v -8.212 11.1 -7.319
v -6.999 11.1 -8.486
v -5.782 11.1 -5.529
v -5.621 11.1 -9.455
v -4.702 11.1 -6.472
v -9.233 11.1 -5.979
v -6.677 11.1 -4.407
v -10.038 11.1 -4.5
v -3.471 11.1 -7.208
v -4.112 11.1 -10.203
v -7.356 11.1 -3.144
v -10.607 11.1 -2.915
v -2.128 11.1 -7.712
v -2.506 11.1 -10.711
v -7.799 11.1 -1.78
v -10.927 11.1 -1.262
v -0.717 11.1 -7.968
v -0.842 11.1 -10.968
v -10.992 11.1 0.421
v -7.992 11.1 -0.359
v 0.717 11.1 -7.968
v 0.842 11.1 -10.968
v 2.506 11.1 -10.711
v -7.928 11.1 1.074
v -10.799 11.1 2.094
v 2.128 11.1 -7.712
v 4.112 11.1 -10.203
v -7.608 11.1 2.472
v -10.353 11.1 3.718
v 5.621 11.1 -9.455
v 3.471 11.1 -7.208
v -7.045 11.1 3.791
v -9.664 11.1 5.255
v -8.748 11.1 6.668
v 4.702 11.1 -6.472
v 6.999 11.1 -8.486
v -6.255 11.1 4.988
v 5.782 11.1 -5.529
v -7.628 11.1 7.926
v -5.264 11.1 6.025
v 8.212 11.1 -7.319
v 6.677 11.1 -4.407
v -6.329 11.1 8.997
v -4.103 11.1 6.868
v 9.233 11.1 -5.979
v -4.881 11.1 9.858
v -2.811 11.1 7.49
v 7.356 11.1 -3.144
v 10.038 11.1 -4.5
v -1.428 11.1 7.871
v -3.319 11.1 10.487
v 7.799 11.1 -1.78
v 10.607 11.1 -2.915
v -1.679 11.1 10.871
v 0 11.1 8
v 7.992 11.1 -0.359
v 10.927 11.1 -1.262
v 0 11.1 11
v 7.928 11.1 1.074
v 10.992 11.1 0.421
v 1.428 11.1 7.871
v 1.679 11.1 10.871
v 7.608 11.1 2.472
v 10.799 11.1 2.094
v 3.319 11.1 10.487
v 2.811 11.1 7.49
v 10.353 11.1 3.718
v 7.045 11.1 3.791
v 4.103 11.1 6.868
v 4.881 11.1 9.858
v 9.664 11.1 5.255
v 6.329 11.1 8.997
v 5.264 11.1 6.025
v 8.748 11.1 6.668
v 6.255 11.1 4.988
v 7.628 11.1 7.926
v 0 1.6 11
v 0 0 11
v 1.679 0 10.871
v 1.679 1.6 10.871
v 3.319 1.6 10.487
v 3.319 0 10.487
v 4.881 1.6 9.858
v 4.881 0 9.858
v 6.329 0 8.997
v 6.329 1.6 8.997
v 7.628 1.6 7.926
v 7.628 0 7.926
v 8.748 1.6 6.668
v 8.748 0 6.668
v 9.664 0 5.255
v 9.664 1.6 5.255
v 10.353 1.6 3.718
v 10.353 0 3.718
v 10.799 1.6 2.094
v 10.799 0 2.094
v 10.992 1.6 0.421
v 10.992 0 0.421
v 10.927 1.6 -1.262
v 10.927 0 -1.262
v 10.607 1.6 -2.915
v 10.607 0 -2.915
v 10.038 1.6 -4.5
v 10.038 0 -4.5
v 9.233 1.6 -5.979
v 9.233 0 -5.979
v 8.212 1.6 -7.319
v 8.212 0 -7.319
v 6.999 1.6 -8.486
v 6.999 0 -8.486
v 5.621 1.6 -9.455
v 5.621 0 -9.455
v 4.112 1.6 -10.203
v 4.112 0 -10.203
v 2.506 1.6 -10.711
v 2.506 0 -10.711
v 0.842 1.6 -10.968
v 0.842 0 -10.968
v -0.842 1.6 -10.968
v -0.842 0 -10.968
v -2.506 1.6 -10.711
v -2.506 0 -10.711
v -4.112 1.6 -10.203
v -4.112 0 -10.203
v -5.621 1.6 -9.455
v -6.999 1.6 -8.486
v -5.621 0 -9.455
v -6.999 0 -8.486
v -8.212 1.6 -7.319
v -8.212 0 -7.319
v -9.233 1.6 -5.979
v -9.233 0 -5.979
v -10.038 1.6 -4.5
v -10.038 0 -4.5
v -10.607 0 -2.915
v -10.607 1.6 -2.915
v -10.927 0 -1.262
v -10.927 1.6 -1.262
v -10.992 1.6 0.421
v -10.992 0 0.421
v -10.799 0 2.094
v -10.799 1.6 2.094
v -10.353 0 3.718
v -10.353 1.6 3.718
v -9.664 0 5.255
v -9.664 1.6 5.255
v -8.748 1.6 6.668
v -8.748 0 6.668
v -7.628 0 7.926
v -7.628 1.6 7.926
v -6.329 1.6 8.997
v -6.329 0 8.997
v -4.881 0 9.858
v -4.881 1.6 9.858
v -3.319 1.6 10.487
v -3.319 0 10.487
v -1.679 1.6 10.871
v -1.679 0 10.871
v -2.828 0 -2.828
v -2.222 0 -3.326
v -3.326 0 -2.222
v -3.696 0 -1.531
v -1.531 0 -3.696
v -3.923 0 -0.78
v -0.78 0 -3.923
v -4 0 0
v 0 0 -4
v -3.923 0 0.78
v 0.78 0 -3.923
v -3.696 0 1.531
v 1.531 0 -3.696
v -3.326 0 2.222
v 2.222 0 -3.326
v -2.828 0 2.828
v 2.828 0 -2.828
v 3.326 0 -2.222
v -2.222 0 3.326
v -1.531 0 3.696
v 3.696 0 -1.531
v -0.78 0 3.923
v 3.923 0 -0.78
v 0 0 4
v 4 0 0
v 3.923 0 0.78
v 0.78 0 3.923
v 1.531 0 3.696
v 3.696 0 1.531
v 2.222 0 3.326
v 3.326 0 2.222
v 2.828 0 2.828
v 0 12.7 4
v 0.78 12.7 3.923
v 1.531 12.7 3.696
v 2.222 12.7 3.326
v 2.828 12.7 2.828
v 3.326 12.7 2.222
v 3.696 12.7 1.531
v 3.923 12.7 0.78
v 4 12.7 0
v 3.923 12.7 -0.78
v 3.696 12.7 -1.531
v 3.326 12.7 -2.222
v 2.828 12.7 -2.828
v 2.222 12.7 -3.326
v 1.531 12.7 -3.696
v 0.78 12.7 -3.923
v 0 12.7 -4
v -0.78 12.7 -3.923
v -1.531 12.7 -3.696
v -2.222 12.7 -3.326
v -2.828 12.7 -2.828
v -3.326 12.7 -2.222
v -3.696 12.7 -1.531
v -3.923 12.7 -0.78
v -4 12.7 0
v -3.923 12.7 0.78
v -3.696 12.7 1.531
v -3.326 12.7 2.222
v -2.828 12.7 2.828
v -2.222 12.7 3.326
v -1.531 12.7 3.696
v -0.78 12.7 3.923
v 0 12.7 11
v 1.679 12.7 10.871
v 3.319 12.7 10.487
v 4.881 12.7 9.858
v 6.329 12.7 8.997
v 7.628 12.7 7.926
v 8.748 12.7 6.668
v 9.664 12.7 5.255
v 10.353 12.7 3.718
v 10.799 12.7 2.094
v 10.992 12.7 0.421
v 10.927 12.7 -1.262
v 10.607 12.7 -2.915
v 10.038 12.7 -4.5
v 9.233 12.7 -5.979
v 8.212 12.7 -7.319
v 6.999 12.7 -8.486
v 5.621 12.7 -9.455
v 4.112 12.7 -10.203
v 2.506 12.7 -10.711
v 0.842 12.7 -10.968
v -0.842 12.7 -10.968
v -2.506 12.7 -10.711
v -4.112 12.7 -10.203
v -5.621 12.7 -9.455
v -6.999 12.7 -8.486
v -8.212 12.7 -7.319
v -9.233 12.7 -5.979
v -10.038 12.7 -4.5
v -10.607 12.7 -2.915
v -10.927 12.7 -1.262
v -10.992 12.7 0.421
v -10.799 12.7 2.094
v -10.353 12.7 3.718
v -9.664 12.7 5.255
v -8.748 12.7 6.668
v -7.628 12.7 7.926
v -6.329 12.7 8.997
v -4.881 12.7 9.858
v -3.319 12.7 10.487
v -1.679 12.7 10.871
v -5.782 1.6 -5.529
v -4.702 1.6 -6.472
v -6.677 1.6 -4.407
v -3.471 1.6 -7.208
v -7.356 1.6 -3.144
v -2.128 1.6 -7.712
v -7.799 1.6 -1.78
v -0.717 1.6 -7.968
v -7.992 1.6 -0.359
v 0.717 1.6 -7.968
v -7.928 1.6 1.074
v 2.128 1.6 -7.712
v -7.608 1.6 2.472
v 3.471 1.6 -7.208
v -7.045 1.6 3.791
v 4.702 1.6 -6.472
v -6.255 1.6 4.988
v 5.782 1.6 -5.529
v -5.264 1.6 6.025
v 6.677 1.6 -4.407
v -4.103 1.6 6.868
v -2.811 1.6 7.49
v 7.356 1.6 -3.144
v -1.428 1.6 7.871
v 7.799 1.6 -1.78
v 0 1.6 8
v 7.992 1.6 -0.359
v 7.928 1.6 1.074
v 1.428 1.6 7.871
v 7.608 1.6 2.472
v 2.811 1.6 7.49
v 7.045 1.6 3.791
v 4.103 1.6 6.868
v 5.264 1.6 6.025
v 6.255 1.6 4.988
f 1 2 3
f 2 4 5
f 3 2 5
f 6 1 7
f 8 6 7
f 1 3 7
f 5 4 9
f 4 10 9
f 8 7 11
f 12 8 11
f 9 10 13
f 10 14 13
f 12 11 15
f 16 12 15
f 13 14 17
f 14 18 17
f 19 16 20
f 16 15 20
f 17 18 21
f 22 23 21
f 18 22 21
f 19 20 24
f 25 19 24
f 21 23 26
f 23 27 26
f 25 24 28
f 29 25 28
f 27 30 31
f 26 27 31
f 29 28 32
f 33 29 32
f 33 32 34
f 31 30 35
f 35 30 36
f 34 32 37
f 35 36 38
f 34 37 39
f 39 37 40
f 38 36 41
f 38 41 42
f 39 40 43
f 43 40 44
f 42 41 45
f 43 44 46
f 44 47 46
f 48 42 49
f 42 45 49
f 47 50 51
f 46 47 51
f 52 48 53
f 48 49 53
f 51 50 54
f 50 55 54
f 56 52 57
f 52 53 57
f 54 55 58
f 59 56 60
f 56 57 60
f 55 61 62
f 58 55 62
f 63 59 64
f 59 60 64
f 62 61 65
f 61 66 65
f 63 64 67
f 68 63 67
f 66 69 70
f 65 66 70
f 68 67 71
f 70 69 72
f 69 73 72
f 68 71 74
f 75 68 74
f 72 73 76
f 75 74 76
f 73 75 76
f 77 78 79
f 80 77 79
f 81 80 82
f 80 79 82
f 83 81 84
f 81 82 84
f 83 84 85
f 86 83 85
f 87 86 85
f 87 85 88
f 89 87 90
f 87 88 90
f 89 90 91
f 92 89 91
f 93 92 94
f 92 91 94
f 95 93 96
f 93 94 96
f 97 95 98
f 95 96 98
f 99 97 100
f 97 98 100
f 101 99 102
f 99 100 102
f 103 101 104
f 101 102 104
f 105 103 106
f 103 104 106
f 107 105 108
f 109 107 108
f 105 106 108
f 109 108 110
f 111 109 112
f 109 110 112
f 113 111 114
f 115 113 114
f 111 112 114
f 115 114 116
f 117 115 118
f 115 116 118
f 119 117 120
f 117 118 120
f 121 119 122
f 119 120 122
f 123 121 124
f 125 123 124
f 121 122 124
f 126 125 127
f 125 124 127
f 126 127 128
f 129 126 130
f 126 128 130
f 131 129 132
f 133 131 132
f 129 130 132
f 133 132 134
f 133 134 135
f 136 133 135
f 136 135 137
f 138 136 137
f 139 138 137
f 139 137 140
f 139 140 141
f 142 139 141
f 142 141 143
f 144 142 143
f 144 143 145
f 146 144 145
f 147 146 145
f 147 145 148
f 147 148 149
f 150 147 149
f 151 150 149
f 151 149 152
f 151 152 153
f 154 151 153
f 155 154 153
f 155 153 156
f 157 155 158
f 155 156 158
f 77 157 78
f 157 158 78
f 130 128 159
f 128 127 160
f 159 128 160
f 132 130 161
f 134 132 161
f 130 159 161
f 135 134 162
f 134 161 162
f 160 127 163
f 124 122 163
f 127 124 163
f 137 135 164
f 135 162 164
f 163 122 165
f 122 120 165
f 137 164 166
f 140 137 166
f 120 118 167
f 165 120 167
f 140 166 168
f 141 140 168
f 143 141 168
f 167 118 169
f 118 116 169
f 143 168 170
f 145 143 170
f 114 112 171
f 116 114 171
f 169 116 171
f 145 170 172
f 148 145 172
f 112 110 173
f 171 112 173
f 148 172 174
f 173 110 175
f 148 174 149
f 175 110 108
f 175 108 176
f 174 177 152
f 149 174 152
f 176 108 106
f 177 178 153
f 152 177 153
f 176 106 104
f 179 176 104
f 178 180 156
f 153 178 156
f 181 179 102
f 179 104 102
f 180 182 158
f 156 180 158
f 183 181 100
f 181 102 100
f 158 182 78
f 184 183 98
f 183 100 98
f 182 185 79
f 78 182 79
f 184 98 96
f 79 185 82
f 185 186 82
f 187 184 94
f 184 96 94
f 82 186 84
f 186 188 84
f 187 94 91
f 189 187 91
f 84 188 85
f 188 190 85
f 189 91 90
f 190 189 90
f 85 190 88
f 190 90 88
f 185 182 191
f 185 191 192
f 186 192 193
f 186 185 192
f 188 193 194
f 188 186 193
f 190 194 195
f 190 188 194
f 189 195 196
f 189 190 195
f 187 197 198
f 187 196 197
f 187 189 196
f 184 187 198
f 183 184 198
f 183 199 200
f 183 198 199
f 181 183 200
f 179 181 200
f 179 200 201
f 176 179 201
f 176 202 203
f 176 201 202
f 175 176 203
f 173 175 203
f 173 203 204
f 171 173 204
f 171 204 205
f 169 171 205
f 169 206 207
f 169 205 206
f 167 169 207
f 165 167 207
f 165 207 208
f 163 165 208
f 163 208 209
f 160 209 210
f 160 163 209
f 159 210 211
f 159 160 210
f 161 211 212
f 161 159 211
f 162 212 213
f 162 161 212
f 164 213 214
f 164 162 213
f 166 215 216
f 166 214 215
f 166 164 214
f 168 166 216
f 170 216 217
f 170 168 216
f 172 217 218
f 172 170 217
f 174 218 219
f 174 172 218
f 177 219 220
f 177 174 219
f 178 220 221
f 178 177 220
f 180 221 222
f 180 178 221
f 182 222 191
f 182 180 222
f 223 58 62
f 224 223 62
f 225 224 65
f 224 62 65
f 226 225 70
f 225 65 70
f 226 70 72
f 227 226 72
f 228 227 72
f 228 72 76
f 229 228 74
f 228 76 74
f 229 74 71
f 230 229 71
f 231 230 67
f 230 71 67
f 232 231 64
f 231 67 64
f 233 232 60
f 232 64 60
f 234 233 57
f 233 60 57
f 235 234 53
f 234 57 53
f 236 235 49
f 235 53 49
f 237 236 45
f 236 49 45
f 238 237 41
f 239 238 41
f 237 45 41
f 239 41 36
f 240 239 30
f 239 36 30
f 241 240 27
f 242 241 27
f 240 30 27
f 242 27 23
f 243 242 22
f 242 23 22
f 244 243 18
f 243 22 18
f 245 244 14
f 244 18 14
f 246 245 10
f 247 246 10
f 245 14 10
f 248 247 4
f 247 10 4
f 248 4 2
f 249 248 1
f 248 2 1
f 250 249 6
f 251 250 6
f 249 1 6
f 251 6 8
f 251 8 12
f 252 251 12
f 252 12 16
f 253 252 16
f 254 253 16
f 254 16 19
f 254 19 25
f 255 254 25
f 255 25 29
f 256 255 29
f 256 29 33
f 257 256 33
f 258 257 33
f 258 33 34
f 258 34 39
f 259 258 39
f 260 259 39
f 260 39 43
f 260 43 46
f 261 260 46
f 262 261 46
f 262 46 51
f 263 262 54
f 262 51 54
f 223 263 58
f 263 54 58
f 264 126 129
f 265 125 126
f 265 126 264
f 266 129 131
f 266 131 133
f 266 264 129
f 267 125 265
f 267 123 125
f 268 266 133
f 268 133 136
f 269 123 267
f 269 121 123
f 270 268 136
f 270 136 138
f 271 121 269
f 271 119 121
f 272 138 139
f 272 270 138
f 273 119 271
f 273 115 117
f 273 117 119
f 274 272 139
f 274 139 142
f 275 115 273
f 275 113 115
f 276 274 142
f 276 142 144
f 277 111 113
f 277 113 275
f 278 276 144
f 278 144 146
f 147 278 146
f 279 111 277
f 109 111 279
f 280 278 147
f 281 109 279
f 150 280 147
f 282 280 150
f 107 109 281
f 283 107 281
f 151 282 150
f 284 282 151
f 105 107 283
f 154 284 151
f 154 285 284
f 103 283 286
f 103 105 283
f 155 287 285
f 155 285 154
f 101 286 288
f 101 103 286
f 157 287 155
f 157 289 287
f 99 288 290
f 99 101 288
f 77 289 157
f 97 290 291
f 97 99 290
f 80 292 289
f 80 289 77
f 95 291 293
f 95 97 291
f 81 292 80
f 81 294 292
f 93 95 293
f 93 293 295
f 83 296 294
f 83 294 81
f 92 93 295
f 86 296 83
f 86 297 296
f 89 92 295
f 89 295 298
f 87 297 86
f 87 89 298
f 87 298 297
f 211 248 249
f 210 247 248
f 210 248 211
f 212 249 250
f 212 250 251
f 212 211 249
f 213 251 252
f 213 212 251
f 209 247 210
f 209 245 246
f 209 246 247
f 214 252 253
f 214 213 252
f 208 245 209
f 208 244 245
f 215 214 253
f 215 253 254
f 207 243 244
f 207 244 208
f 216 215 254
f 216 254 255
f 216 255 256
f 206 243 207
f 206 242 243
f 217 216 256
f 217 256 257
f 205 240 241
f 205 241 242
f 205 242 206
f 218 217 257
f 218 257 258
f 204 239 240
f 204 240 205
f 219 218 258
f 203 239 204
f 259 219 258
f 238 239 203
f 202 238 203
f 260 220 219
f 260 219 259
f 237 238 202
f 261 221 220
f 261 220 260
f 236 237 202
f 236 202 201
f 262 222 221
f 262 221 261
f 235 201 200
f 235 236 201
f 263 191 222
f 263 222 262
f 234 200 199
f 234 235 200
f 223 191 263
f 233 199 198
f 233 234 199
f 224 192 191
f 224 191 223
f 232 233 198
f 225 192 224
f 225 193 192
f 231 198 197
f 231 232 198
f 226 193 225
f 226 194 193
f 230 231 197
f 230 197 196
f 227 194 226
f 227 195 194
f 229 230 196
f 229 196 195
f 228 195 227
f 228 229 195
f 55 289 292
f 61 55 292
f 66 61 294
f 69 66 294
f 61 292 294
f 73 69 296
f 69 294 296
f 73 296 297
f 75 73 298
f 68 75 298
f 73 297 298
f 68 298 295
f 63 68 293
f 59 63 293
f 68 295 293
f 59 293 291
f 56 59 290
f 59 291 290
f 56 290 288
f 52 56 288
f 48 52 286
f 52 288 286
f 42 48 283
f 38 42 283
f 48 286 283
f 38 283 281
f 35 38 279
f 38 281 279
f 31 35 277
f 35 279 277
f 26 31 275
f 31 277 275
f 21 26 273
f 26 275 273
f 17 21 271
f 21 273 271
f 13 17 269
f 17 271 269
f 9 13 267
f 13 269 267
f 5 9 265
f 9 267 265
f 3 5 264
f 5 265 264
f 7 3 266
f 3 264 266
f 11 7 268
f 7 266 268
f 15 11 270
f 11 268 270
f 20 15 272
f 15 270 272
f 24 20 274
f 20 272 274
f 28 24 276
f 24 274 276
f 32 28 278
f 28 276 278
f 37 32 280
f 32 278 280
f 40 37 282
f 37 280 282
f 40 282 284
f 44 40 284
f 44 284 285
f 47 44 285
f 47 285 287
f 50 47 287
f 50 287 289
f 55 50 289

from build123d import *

# Parameters (mm, degrees)
SKETCH1_R               = 11
BOSS_EXTRUDE1_DEPTH     = 1.6
SKETCH2_R               = 8
BOSS_EXTRUDE2_DEPTH     = 9.5
SKETCH3_R               = 11
BOSS_EXTRUDE3_DEPTH     = 1.6
CUT_EXTRUDE1_DEPTH      = 21.082081565
CUT_EXTRUDE1_DEPTH_BACK = 21.082081565
SKETCH4_R               = 4


with BuildPart() as part:
    # Sketch1 → Boss-Extrude1 (new body)
    with BuildSketch(Plane(origin=(0, 0, 0), x_dir=(1, 0, 0), z_dir=(0, 1, 0))):
        with Locations(Location((0, 0, 0), (0, 0, 270))):
            Circle(SKETCH1_R)
    extrude(amount=BOSS_EXTRUDE1_DEPTH)

    # Sketch2 → Boss-Extrude2 (add)
    with BuildSketch(Plane(origin=(0, 1.6, 0), x_dir=(1, 0, 0), z_dir=(0, 1, 0))):
        with Locations(Location((0, 0, 0), (0, 0, 270))):
            Circle(SKETCH2_R)
    extrude(amount=BOSS_EXTRUDE2_DEPTH)

    # Sketch3 → Boss-Extrude3 (add)
    with BuildSketch(Plane(origin=(0, 11.1, 0), x_dir=(1, 0, 0), z_dir=(0, 1, 0))):
        with Locations(Location((0, 0, 0), (0, 0, 270))):
            Circle(SKETCH3_R)
    extrude(amount=BOSS_EXTRUDE3_DEPTH)

    # Sketch4 → Cut-Extrude1 (cut, two sides: drawn at the far end of the back side and taken through both)
    with BuildSketch(Plane(origin=(0, 12.7, 0), x_dir=(1, 0, 0), z_dir=(0, 1, 0)).offset(-CUT_EXTRUDE1_DEPTH_BACK)):
        with Locations(Location((0, 0, 0), (0, 0, 270))):
            Circle(SKETCH4_R)
    extrude(amount=CUT_EXTRUDE1_DEPTH + CUT_EXTRUDE1_DEPTH_BACK, mode=Mode.SUBTRACT)


solid = part.part
